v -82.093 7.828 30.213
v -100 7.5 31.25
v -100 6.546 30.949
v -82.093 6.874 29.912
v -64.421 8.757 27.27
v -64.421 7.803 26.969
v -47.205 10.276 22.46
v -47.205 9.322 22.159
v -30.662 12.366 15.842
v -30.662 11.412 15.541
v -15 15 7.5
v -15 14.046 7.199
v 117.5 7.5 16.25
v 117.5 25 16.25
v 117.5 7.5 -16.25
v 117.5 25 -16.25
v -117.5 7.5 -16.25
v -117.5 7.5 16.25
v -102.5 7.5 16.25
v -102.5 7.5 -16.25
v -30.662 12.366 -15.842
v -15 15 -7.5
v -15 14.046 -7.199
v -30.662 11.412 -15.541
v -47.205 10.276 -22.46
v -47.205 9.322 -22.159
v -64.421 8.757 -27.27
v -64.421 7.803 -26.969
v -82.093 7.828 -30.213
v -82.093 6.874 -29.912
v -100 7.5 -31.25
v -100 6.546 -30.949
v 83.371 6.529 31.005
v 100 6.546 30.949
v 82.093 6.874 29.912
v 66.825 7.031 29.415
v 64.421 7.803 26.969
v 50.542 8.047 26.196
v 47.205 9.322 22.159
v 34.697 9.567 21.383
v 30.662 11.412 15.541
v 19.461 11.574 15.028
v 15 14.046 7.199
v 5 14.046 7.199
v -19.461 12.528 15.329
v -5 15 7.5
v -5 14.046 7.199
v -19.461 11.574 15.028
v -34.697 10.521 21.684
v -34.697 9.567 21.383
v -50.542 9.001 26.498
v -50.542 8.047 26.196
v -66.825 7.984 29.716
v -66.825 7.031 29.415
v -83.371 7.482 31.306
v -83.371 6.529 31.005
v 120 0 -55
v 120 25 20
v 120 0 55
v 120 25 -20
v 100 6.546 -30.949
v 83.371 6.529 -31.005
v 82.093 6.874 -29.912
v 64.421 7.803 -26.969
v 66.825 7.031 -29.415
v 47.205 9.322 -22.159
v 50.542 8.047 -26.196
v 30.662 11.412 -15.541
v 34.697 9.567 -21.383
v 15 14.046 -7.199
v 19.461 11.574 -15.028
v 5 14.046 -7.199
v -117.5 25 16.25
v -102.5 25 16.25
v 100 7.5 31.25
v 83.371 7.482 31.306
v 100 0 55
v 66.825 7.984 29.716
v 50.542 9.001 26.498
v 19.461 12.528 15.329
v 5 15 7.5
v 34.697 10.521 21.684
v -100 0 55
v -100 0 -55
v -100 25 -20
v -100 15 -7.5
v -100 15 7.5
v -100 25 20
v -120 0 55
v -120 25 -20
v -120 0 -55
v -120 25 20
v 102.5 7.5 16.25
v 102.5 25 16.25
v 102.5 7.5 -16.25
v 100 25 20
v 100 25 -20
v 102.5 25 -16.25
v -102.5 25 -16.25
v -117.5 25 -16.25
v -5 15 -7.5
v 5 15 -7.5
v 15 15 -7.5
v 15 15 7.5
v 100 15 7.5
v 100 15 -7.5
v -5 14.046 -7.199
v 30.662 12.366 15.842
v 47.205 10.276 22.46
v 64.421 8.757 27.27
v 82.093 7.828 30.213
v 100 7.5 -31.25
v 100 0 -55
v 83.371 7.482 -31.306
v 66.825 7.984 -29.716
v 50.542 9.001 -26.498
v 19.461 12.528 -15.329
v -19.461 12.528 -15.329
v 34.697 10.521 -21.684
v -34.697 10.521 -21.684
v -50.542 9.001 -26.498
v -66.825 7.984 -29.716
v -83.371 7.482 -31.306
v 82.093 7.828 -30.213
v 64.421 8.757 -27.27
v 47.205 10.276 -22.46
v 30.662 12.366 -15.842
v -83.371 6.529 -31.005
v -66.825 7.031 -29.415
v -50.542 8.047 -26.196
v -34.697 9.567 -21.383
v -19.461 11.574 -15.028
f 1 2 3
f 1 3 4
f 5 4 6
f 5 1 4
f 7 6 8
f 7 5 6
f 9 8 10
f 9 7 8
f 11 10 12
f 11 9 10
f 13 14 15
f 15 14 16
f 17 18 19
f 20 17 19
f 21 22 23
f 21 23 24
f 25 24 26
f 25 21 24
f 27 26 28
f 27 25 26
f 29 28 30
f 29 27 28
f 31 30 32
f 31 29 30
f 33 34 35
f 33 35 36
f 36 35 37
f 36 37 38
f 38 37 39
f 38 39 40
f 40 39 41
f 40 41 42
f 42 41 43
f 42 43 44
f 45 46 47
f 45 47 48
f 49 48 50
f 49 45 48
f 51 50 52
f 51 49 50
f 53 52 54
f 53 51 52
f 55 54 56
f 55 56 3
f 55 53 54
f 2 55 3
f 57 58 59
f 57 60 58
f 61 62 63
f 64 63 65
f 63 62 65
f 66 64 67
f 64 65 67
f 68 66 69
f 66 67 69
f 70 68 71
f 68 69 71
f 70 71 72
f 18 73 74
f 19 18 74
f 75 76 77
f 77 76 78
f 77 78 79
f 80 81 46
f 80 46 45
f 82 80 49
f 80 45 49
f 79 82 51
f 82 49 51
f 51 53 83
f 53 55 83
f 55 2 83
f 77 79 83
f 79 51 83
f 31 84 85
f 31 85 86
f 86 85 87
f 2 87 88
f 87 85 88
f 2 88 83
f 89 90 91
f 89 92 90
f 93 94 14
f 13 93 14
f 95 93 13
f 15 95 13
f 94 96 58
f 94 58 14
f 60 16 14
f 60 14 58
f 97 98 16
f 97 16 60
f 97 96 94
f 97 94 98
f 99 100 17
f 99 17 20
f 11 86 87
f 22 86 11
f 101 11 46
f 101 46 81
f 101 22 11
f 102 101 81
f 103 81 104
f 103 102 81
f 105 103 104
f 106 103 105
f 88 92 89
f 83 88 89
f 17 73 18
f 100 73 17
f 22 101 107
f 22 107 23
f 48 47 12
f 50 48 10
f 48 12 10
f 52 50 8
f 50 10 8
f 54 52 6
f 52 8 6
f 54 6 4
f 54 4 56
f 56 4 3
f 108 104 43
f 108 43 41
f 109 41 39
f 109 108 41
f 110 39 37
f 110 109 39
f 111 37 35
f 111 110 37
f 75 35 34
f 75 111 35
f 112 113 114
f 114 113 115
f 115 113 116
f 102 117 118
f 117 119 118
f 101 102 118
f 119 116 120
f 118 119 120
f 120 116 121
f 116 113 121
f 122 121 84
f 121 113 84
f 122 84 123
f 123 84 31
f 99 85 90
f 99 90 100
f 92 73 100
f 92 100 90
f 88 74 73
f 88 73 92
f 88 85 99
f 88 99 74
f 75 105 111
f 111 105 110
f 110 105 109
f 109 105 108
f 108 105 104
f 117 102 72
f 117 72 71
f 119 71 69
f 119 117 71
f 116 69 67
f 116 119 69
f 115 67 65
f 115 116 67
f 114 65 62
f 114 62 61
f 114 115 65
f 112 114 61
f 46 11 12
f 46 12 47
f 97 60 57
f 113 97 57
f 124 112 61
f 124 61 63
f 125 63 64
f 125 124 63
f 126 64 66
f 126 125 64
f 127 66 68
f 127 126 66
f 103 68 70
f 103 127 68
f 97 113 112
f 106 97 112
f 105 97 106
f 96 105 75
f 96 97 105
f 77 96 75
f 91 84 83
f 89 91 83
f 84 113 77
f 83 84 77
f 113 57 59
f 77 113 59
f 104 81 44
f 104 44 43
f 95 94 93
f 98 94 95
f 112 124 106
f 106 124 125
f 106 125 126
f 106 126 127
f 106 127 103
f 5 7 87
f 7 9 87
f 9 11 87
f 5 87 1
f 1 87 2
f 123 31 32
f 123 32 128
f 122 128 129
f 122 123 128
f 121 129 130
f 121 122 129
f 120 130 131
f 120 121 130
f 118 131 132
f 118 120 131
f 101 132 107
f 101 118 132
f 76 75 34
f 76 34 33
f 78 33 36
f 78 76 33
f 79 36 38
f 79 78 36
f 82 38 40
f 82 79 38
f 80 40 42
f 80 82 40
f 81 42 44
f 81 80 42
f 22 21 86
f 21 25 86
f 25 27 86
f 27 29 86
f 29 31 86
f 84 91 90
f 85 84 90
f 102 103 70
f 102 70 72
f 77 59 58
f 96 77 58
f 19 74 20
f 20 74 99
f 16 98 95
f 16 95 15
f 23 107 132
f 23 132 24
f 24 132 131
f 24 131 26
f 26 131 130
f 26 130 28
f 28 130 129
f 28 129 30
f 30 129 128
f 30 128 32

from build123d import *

# Parameters (mm, degrees)
SKETCH2_W           = 200
SKETCH2_H           = 110
BOSS_EXTRUDE2_DEPTH = 15
SKETCH3_W           = 110
SKETCH3_H           = 25
BOSS_EXTRUDE3_DEPTH = 13
CUT_EXTRUDE1_DEPTH  = 200
SKETCH8_W           = 110
SKETCH8_H           = 25
BOSS_EXTRUDE5_DEPTH = 7
SKETCH9_W           = 15
SKETCH9_H           = 32.5
CUT_EXTRUDE2_DEPTH  = 17.5
SKETCH10_W          = 110
SKETCH10_H          = 25
BOSS_EXTRUDE6_DEPTH = 20
SKETCH11_W          = 15
SKETCH11_H          = 32.5
CUT_EXTRUDE3_DEPTH  = 17.5
CUT_EXTRUDE4_DEPTH  = 20
CUT_EXTRUDE5_DEPTH  = 20
CUT_EXTRUDE11_DEPTH = 1
CUT_EXTRUDE12_DEPTH = 1


with BuildPart() as part:
    # Sketch2 → Boss-Extrude2 (new body)
    with BuildSketch(Plane(origin=(0, 0, 0), x_dir=(1, 0, 0), z_dir=(0, 1, 0))):
        Rectangle(SKETCH2_W, SKETCH2_H)
    extrude(amount=BOSS_EXTRUDE2_DEPTH)

    # Sketch3 → Boss-Extrude3 (add)
    with BuildSketch(Plane(origin=(100, 0, 0), x_dir=(0, 0, -1), z_dir=(1, 0, 0))):
        with Locations((0, 12.5)):
            Rectangle(SKETCH3_W, SKETCH3_H)
    extrude(amount=BOSS_EXTRUDE3_DEPTH)

    # Sketch6 → Cut-Extrude1 (cut)
    with BuildSketch(Plane.ZY.offset(100)):
        Polygon((-55, 0), (-7.5, 15), (-55, 15), align=None)
        Polygon((7.5, 15), (55, 0), (55, 15), align=None)
    extrude(amount=-CUT_EXTRUDE1_DEPTH, mode=Mode.SUBTRACT)

    # Sketch8 → Boss-Extrude5 (add)
    with BuildSketch(Plane(origin=(113, 0, 0), x_dir=(0, 0, -1), z_dir=(1, 0, 0))):
        with Locations((0, 12.5)):
            Rectangle(SKETCH8_W, SKETCH8_H)
    extrude(amount=BOSS_EXTRUDE5_DEPTH)

    # Sketch9 → Cut-Extrude2 (cut)
    with BuildSketch(Plane(origin=(0, 25, 0), x_dir=(1, 0, 0), z_dir=(0, 1, 0))):
        with Locations((110, 0)):
            Rectangle(SKETCH9_W, SKETCH9_H)
    extrude(amount=-CUT_EXTRUDE2_DEPTH, mode=Mode.SUBTRACT)

    # Sketch10 → Boss-Extrude6 (add)
    with BuildSketch(Plane.ZY.offset(100)):
        with Locations((0, 12.5)):
            Rectangle(SKETCH10_W, SKETCH10_H)
    extrude(amount=BOSS_EXTRUDE6_DEPTH)

    # Sketch11 → Cut-Extrude3 (cut)
    with BuildSketch(Plane(origin=(0, 25, 0), x_dir=(1, 0, 0), z_dir=(0, 1, 0))):
        with Locations((-110, 0)):
            Rectangle(SKETCH11_W, SKETCH11_H)
    extrude(amount=-CUT_EXTRUDE3_DEPTH, mode=Mode.SUBTRACT)

    # Sketch12 → Cut-Extrude4 (cut)
    with BuildSketch(Plane.ZY.offset(120)):
        Polygon((20, 25), (55, 0), (55, 25), align=None)
        Polygon((-20, 25), (-55, 25), (-55, 0), align=None)
    extrude(amount=-CUT_EXTRUDE4_DEPTH, mode=Mode.SUBTRACT)

    # Sketch13 → Cut-Extrude5 (cut)
    with BuildSketch(Plane(origin=(120, 0, 0), x_dir=(0, 0, -1), z_dir=(1, 0, 0))):
        Polygon((-20, 25), (-55, 25), (-55, 0), align=None)
        Polygon((20, 25), (55, 0), (55, 25), align=None)
    extrude(amount=-CUT_EXTRUDE5_DEPTH, mode=Mode.SUBTRACT)

    # Sketch17 → Cut-Extrude11 (cut)
    with BuildSketch(Plane(origin=(0, 15.793450882, 4.987405542), x_dir=(1, 0, 0), z_dir=(0, 0.953582665, 0.301131368))):
        with BuildLine():
            Line((-15, -2.634899469), (-5, -2.634899469))
            ThreePointArc((-5, -2.634899469), (-50.541779196, -22.5572379), (-100, -27.540973026))
            ThreePointArc((-100, -27.540973026), (-55.742204199, -21.086980727), (-15, -2.634899469))
        make_face()
        with BuildLine():
            Line((5, -2.634899469), (15, -2.634899469))
            ThreePointArc((15, -2.634899469), (55.742204199, -21.086980727), (100, -27.540973026))
            ThreePointArc((100, -27.540973026), (50.541779196, -22.5572379), (5, -2.634899469))
        make_face()
    extrude(amount=-CUT_EXTRUDE11_DEPTH, mode=Mode.SUBTRACT)

    # Sketch18 → Cut-Extrude12 (cut)
    with BuildSketch(Plane(origin=(0, 15.793450882, -4.987405542), x_dir=(1, 0, 0), z_dir=(0, 0.953582665, -0.301131368))):
        with BuildLine():
            Line((15, 2.634899469), (5, 2.634899469))
            ThreePointArc((5, 2.634899469), (50.541779196, 22.5572379), (100, 27.540973026))
            ThreePointArc((100, 27.540973026), (55.742204199, 21.086980727), (15, 2.634899469))
        make_face()
        with BuildLine():
            Line((-5, 2.634899469), (-15, 2.634899469))
            ThreePointArc((-15, 2.634899469), (-55.742204199, 21.086980727), (-100, 27.540973026))
            ThreePointArc((-100, 27.540973026), (-50.541779196, 22.5572379), (-5, 2.634899469))
        make_face()
    extrude(amount=-CUT_EXTRUDE12_DEPTH, mode=Mode.SUBTRACT)


solid = part.part
